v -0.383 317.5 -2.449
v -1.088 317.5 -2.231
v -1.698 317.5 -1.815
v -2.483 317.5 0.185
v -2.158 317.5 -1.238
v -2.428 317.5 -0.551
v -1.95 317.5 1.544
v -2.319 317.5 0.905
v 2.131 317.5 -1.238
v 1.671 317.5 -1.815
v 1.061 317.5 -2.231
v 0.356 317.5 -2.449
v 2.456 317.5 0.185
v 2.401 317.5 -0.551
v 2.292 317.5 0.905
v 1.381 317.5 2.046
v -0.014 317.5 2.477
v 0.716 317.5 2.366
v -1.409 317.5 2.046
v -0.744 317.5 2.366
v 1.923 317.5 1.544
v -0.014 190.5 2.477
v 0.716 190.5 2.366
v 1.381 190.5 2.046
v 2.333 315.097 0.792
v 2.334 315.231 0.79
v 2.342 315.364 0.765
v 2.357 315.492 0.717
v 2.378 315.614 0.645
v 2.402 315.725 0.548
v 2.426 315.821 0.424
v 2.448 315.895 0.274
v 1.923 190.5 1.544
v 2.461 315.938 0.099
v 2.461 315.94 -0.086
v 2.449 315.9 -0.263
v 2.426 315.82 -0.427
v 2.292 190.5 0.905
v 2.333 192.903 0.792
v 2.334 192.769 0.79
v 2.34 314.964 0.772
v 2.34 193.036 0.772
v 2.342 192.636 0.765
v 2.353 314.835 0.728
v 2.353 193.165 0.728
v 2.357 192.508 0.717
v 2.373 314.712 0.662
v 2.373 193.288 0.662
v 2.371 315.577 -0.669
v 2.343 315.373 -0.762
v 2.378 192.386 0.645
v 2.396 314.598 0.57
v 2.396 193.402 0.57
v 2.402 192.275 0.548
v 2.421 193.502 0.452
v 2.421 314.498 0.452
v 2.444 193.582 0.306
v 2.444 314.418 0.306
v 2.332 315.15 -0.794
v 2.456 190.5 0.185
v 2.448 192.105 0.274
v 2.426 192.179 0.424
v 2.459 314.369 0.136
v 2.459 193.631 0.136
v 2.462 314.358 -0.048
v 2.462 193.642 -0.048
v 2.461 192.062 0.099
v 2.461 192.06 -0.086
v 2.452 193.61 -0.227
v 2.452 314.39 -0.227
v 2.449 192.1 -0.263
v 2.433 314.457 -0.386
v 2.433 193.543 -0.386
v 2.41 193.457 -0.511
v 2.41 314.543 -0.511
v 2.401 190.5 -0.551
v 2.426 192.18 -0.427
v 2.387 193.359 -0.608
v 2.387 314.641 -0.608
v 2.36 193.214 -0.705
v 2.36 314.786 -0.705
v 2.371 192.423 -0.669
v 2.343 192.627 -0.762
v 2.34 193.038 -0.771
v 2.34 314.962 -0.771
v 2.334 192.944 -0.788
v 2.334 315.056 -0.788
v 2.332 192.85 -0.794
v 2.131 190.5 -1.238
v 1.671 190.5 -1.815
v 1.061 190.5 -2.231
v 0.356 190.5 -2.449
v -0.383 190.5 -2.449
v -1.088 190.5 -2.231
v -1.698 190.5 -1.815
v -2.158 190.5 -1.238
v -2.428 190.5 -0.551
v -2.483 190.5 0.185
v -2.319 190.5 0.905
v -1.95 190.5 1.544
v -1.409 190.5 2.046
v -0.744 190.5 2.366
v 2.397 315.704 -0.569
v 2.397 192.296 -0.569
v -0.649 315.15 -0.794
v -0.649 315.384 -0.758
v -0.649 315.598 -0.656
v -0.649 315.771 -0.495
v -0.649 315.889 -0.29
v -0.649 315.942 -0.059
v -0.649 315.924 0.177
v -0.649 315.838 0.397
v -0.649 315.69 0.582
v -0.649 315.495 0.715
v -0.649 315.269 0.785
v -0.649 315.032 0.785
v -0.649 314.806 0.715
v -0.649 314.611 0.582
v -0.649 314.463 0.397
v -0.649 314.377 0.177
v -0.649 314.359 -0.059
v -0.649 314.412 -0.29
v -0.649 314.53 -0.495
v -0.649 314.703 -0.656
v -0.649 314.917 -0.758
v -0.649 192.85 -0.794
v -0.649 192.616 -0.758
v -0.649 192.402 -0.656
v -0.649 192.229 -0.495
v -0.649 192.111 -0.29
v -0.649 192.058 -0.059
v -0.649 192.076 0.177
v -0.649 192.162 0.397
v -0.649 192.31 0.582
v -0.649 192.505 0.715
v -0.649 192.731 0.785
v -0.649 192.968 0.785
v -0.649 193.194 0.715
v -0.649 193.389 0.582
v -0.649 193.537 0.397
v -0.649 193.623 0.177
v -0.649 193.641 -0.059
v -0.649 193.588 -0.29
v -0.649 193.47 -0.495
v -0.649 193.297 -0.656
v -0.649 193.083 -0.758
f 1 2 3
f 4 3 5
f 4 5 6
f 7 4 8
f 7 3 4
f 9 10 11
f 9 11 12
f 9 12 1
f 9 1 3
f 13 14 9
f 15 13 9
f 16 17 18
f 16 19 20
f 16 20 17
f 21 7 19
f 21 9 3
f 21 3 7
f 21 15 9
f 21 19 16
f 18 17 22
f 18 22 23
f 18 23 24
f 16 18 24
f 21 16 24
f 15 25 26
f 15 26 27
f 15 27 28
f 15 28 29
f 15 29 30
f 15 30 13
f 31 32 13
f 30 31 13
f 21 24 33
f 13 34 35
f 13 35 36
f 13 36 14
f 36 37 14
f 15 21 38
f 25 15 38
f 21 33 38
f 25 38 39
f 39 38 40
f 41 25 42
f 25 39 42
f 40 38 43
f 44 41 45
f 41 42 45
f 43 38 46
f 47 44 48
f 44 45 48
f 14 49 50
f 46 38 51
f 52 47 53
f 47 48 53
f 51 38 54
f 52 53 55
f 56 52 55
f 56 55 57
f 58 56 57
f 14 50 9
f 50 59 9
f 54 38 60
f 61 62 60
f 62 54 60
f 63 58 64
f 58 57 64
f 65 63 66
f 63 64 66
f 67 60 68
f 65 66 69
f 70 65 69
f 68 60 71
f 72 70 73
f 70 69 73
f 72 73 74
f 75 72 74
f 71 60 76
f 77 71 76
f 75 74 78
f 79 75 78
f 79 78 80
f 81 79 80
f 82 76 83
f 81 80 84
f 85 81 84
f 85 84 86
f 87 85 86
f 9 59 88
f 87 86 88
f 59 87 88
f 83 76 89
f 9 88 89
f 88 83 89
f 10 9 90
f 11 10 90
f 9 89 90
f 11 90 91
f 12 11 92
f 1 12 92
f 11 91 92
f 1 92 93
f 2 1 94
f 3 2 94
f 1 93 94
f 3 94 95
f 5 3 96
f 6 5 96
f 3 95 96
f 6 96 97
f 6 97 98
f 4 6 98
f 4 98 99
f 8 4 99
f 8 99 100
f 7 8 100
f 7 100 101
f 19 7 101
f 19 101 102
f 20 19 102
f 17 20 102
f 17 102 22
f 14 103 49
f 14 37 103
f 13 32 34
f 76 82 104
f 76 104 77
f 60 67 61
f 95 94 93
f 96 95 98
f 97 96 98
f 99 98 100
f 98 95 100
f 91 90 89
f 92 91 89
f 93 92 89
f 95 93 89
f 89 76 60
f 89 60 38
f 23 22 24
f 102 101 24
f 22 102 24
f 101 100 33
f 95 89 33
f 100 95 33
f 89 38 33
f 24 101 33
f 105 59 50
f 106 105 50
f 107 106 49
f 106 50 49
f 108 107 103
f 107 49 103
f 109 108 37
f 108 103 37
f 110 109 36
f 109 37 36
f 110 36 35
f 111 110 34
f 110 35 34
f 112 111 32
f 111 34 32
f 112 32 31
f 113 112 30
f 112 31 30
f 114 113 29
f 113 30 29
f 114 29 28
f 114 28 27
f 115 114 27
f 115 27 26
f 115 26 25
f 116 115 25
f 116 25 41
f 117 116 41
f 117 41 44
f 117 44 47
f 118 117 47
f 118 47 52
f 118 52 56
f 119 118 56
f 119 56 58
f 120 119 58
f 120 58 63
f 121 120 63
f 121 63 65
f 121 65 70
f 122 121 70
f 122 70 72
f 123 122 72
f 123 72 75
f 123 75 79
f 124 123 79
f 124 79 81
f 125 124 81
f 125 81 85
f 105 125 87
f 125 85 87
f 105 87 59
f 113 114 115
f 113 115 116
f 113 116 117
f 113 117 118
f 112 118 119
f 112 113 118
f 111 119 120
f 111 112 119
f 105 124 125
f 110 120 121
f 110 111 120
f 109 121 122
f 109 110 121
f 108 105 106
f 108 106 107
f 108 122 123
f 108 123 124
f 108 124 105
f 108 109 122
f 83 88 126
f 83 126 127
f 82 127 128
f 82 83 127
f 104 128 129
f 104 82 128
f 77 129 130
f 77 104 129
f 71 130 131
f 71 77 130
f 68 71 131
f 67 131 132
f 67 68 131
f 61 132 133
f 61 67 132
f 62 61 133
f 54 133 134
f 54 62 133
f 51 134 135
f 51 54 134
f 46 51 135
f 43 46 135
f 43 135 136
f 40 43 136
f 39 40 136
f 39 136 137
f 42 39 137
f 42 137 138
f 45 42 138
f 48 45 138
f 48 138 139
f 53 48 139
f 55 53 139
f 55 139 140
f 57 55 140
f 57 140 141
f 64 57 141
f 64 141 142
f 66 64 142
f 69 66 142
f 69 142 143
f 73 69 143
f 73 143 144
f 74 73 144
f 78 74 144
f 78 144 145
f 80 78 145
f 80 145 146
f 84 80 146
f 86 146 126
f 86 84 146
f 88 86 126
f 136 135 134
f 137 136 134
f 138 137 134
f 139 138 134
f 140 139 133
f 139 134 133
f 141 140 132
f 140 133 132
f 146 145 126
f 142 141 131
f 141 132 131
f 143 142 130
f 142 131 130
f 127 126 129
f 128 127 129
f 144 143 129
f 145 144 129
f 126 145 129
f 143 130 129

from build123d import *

# Parameters (mm, degrees)
SKETCH1_R           = 9.906
BOSS_EXTRUDE1_DEPTH = 508
CUT_EXTRUDE1_START  = 20.32
SKETCH2_R           = 3.175
CUT_EXTRUDE1_DEPTH  = 22.86
SCALE1_SCALE        = 0.25


with BuildPart() as part:
    # Sketch1 → Boss-Extrude1 (new body)
    with BuildSketch(Plane(origin=(0, 0, 0), x_dir=(1, 0, 0), z_dir=(0, 1, 0))):
        with Locations(Location((0, 0, 0), (0, 0, 270))):
            Circle(SKETCH1_R)
    extrude(amount=BOSS_EXTRUDE1_DEPTH)

    # Sketch2 → Cut-Extrude1 (cut)
    with BuildSketch(Plane(origin=(0, 0, 0), x_dir=(0, 0, -1), z_dir=(1, 0, 0)).offset(CUT_EXTRUDE1_START)):
        with Locations((0, 498.602)):
            Circle(SKETCH2_R)
    cut_extrude1 = extrude(amount=-CUT_EXTRUDE1_DEPTH, mode=Mode.SUBTRACT)

    # Mirror1: Cut-Extrude1 across plane
    add(cut_extrude1.mirror(Plane.ZX.offset(254)), mode=Mode.SUBTRACT)


with BuildPart() as part_1:
    # Scale1: scaled about (-0.018116733, 254, 1.117e-06)
    add(part.part.scale(SCALE1_SCALE).moved(Location((-0.01358755, 190.5, 8.38e-07))))


solid = part_1.part
